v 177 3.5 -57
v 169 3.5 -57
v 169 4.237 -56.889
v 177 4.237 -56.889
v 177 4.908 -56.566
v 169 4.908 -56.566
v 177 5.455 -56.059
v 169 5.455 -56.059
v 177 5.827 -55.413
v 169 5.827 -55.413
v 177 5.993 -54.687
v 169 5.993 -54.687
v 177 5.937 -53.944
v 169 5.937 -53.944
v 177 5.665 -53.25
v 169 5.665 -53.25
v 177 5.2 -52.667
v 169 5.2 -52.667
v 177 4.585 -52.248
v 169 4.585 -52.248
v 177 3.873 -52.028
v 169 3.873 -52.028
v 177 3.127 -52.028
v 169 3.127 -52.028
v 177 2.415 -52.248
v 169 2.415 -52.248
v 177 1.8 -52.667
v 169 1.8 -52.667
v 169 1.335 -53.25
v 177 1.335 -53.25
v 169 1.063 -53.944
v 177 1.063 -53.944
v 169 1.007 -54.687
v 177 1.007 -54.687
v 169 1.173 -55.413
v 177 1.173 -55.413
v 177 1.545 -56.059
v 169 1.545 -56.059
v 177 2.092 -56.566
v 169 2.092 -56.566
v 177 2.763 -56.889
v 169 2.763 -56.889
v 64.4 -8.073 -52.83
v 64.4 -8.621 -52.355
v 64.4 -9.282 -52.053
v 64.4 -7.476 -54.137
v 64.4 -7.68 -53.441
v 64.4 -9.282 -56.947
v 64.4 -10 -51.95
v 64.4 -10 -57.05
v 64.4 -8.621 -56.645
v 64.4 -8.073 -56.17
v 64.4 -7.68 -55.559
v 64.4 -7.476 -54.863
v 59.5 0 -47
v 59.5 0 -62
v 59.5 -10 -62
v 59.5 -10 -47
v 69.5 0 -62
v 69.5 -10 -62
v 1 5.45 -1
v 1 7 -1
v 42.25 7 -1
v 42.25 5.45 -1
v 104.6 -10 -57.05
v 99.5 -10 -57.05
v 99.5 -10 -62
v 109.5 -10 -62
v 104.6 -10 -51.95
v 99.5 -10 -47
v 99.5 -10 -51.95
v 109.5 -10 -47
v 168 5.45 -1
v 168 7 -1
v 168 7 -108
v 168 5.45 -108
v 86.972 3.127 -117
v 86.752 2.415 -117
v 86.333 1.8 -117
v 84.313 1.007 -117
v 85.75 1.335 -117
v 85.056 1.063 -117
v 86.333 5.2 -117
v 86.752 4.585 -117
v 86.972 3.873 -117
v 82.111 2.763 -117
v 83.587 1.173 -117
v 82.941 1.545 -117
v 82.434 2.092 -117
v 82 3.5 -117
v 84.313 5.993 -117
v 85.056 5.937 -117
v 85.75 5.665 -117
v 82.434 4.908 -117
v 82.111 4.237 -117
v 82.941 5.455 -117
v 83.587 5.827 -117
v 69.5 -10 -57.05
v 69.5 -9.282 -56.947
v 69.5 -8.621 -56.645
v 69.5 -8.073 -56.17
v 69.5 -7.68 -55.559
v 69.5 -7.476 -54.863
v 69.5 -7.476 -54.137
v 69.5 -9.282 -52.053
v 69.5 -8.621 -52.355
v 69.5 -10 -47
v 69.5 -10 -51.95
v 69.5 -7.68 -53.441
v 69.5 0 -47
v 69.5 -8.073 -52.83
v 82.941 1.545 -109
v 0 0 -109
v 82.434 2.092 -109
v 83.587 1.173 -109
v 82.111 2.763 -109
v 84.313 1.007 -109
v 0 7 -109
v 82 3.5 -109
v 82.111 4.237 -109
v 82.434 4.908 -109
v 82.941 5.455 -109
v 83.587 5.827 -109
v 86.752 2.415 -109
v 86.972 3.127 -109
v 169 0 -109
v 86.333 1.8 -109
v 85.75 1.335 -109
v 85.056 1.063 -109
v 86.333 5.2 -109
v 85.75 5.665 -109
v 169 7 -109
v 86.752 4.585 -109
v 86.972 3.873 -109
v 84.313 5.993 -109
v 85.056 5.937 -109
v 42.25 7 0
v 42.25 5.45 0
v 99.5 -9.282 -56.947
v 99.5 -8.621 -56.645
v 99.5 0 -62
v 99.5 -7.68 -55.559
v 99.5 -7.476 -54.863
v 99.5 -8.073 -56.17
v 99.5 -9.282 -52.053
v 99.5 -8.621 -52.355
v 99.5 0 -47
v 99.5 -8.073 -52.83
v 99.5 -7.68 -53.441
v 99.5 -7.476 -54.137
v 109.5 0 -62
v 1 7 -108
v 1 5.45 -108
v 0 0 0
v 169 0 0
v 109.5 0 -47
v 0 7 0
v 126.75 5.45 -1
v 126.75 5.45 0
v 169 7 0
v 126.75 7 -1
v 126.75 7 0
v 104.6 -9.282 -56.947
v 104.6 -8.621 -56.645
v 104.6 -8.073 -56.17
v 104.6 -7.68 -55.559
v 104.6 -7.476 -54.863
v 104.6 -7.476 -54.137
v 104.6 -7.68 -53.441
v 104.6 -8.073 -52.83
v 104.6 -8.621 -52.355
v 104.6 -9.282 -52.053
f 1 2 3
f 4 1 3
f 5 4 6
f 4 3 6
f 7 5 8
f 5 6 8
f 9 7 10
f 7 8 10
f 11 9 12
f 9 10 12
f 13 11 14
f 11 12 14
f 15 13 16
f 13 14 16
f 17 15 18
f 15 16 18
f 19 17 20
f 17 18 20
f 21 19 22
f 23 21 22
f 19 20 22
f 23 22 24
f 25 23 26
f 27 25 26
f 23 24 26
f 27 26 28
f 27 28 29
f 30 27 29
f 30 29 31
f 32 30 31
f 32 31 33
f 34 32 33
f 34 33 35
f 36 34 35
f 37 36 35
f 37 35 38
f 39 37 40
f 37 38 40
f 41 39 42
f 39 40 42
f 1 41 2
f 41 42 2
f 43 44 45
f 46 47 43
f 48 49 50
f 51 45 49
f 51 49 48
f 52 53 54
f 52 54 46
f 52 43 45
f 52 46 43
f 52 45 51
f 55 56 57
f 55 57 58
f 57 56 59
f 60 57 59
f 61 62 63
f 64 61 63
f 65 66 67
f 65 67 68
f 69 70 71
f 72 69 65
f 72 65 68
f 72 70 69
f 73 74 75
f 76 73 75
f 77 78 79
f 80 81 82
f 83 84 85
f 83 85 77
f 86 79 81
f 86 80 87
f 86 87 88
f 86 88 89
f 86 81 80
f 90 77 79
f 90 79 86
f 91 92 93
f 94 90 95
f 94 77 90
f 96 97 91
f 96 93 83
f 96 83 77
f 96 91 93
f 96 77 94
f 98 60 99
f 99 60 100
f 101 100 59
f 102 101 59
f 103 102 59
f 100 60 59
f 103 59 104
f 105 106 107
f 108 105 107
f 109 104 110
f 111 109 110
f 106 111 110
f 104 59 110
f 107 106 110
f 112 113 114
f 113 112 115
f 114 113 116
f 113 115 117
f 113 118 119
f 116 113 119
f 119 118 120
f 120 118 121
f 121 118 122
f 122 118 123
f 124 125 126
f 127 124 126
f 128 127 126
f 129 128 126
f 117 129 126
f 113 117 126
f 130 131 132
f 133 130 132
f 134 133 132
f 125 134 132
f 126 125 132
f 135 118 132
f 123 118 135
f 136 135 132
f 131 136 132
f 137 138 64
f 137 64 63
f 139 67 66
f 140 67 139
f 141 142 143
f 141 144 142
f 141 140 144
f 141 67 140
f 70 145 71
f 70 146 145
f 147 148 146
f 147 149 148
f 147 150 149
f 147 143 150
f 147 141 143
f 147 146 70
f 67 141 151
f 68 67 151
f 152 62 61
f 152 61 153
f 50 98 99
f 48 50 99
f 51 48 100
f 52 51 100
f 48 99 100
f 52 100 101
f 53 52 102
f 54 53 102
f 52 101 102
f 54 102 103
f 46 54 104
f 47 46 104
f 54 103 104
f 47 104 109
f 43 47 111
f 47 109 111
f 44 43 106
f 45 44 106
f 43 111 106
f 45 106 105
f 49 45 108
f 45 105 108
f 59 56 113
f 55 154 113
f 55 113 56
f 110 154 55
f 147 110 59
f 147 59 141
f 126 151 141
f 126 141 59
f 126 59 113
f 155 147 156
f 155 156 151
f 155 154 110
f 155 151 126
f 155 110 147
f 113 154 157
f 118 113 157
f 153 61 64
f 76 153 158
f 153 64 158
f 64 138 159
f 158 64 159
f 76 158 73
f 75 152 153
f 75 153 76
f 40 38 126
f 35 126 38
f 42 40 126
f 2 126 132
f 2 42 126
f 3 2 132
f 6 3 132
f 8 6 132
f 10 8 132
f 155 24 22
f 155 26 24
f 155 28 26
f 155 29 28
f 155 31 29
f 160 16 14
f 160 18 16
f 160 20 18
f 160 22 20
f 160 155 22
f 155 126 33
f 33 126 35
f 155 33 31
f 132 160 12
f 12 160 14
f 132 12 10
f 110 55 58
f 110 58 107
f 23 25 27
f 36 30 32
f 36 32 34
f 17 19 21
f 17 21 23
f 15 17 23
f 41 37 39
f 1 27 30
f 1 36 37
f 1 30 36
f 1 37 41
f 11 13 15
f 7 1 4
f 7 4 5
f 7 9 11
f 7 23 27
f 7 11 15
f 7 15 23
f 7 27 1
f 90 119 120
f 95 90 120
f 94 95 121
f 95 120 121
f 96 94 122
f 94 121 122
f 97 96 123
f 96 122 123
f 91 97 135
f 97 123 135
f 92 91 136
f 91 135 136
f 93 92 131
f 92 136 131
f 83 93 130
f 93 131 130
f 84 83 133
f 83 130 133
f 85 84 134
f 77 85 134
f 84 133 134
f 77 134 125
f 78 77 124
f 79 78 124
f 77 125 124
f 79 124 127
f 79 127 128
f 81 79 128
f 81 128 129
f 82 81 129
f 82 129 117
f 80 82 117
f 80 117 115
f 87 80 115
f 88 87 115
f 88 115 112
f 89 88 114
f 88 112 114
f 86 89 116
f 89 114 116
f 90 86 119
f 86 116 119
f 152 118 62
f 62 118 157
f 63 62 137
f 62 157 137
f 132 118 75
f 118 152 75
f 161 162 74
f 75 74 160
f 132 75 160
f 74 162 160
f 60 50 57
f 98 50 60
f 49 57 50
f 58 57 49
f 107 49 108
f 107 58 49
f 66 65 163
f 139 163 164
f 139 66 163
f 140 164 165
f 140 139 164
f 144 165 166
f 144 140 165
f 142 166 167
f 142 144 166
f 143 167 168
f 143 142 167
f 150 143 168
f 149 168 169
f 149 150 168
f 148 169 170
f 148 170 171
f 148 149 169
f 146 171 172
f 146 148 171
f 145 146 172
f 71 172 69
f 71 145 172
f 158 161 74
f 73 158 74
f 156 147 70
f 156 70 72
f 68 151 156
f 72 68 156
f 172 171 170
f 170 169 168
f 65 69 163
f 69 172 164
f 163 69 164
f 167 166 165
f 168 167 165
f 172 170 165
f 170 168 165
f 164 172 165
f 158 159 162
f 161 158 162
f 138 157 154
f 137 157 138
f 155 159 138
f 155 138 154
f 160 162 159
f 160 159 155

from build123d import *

# Parameters (mm, degrees)
SKETCH1_W               = 169
SKETCH1_H               = 7
BOSS_EXTRUDE1_DEPTH     = 109
SKETCH3_W               = 165
SKETCH3_H               = 105
CUT_EXTRUDE2_DEPTH      = 1.5
SKETCH4_W               = 84.5
SKETCH4_H               = 1.55
CUT_EXTRUDE3_DEPTH      = 2
SKETCH5_R               = 2.5
BOSS_EXTRUDE2_DEPTH     = 8
SKETCH6_R               = 2.5
BOSS_EXTRUDE3_DEPTH     = 8
SKETCH8_W               = 10
SKETCH8_H               = 15
BOSS_EXTRUDE4_DEPTH     = 10
SKETCH9_R               = 2.55
CUT_EXTRUDE4_DEPTH      = 35.1
CUT_EXTRUDE4_DEPTH_BACK = 5.1
SKETCH10_W              = 167
SKETCH10_H              = 107
CUT_EXTRUDE5_DEPTH      = 1.55


with BuildPart() as part:
    # Sketch1 → Boss-Extrude1 (new body)
    with BuildSketch(Plane.XY):
        with Locations((84.5, 3.5)):
            Rectangle(SKETCH1_W, SKETCH1_H)
    extrude(amount=-BOSS_EXTRUDE1_DEPTH)

    # Sketch3 → Cut-Extrude2 (cut)
    with BuildSketch(Plane(origin=(0, 7, 0), x_dir=(1, 0, 0), z_dir=(0, 1, 0))):
        with Locations((84.5, 54.5)):
            Rectangle(SKETCH3_W, SKETCH3_H)
    extrude(amount=-CUT_EXTRUDE2_DEPTH, mode=Mode.SUBTRACT)

    # Sketch4 → Cut-Extrude3 (cut)
    with BuildSketch(Plane.XY):
        with Locations((84.5, 6.225)):
            Rectangle(SKETCH4_W, SKETCH4_H)
    extrude(amount=-CUT_EXTRUDE3_DEPTH, mode=Mode.SUBTRACT)

    # Sketch5 → Boss-Extrude2 (add)
    with BuildSketch(Plane(origin=(169, 0, 0), x_dir=(0, 0, -1), z_dir=(1, 0, 0))):
        with Locations((54.5, 3.5)):
            Circle(SKETCH5_R)
    extrude(amount=BOSS_EXTRUDE2_DEPTH)

    # Sketch6 → Boss-Extrude3 (add)
    with BuildSketch(Plane(origin=(0, 0, -109), x_dir=(-1, 0, 0), z_dir=(0, 0, -1))):
        with Locations((-84.5, 3.5)):
            Circle(SKETCH6_R)
    extrude(amount=BOSS_EXTRUDE3_DEPTH)

    # Sketch8 → Boss-Extrude4 (add)
    with BuildSketch(Plane.XZ):
        with Locations((104.5, -54.5)):
            Rectangle(SKETCH8_W, SKETCH8_H)
        with Locations((64.5, -54.5)):
            Rectangle(SKETCH8_W, SKETCH8_H)
    extrude(amount=BOSS_EXTRUDE4_DEPTH)

    # Sketch9 → Cut-Extrude4 (cut, two sides)
    with BuildSketch(Plane(origin=(69.5, 0, 0), x_dir=(0, 0, -1), z_dir=(1, 0, 0))) as cut_extrude4_sk:
        with Locations((54.5, -10)):
            Circle(SKETCH9_R)
    extrude(amount=CUT_EXTRUDE4_DEPTH, mode=Mode.SUBTRACT)
    extrude(cut_extrude4_sk.sketch, amount=-CUT_EXTRUDE4_DEPTH_BACK, mode=Mode.SUBTRACT)

    # Sketch10 → Cut-Extrude5 (cut)
    with BuildSketch(Plane(origin=(0, 7, 0), x_dir=(1, 0, 0), z_dir=(0, 1, 0))):
        with Locations((84.5, 54.5)):
            Rectangle(SKETCH10_W, SKETCH10_H)
    extrude(amount=-CUT_EXTRUDE5_DEPTH, mode=Mode.SUBTRACT)


solid = part.part
